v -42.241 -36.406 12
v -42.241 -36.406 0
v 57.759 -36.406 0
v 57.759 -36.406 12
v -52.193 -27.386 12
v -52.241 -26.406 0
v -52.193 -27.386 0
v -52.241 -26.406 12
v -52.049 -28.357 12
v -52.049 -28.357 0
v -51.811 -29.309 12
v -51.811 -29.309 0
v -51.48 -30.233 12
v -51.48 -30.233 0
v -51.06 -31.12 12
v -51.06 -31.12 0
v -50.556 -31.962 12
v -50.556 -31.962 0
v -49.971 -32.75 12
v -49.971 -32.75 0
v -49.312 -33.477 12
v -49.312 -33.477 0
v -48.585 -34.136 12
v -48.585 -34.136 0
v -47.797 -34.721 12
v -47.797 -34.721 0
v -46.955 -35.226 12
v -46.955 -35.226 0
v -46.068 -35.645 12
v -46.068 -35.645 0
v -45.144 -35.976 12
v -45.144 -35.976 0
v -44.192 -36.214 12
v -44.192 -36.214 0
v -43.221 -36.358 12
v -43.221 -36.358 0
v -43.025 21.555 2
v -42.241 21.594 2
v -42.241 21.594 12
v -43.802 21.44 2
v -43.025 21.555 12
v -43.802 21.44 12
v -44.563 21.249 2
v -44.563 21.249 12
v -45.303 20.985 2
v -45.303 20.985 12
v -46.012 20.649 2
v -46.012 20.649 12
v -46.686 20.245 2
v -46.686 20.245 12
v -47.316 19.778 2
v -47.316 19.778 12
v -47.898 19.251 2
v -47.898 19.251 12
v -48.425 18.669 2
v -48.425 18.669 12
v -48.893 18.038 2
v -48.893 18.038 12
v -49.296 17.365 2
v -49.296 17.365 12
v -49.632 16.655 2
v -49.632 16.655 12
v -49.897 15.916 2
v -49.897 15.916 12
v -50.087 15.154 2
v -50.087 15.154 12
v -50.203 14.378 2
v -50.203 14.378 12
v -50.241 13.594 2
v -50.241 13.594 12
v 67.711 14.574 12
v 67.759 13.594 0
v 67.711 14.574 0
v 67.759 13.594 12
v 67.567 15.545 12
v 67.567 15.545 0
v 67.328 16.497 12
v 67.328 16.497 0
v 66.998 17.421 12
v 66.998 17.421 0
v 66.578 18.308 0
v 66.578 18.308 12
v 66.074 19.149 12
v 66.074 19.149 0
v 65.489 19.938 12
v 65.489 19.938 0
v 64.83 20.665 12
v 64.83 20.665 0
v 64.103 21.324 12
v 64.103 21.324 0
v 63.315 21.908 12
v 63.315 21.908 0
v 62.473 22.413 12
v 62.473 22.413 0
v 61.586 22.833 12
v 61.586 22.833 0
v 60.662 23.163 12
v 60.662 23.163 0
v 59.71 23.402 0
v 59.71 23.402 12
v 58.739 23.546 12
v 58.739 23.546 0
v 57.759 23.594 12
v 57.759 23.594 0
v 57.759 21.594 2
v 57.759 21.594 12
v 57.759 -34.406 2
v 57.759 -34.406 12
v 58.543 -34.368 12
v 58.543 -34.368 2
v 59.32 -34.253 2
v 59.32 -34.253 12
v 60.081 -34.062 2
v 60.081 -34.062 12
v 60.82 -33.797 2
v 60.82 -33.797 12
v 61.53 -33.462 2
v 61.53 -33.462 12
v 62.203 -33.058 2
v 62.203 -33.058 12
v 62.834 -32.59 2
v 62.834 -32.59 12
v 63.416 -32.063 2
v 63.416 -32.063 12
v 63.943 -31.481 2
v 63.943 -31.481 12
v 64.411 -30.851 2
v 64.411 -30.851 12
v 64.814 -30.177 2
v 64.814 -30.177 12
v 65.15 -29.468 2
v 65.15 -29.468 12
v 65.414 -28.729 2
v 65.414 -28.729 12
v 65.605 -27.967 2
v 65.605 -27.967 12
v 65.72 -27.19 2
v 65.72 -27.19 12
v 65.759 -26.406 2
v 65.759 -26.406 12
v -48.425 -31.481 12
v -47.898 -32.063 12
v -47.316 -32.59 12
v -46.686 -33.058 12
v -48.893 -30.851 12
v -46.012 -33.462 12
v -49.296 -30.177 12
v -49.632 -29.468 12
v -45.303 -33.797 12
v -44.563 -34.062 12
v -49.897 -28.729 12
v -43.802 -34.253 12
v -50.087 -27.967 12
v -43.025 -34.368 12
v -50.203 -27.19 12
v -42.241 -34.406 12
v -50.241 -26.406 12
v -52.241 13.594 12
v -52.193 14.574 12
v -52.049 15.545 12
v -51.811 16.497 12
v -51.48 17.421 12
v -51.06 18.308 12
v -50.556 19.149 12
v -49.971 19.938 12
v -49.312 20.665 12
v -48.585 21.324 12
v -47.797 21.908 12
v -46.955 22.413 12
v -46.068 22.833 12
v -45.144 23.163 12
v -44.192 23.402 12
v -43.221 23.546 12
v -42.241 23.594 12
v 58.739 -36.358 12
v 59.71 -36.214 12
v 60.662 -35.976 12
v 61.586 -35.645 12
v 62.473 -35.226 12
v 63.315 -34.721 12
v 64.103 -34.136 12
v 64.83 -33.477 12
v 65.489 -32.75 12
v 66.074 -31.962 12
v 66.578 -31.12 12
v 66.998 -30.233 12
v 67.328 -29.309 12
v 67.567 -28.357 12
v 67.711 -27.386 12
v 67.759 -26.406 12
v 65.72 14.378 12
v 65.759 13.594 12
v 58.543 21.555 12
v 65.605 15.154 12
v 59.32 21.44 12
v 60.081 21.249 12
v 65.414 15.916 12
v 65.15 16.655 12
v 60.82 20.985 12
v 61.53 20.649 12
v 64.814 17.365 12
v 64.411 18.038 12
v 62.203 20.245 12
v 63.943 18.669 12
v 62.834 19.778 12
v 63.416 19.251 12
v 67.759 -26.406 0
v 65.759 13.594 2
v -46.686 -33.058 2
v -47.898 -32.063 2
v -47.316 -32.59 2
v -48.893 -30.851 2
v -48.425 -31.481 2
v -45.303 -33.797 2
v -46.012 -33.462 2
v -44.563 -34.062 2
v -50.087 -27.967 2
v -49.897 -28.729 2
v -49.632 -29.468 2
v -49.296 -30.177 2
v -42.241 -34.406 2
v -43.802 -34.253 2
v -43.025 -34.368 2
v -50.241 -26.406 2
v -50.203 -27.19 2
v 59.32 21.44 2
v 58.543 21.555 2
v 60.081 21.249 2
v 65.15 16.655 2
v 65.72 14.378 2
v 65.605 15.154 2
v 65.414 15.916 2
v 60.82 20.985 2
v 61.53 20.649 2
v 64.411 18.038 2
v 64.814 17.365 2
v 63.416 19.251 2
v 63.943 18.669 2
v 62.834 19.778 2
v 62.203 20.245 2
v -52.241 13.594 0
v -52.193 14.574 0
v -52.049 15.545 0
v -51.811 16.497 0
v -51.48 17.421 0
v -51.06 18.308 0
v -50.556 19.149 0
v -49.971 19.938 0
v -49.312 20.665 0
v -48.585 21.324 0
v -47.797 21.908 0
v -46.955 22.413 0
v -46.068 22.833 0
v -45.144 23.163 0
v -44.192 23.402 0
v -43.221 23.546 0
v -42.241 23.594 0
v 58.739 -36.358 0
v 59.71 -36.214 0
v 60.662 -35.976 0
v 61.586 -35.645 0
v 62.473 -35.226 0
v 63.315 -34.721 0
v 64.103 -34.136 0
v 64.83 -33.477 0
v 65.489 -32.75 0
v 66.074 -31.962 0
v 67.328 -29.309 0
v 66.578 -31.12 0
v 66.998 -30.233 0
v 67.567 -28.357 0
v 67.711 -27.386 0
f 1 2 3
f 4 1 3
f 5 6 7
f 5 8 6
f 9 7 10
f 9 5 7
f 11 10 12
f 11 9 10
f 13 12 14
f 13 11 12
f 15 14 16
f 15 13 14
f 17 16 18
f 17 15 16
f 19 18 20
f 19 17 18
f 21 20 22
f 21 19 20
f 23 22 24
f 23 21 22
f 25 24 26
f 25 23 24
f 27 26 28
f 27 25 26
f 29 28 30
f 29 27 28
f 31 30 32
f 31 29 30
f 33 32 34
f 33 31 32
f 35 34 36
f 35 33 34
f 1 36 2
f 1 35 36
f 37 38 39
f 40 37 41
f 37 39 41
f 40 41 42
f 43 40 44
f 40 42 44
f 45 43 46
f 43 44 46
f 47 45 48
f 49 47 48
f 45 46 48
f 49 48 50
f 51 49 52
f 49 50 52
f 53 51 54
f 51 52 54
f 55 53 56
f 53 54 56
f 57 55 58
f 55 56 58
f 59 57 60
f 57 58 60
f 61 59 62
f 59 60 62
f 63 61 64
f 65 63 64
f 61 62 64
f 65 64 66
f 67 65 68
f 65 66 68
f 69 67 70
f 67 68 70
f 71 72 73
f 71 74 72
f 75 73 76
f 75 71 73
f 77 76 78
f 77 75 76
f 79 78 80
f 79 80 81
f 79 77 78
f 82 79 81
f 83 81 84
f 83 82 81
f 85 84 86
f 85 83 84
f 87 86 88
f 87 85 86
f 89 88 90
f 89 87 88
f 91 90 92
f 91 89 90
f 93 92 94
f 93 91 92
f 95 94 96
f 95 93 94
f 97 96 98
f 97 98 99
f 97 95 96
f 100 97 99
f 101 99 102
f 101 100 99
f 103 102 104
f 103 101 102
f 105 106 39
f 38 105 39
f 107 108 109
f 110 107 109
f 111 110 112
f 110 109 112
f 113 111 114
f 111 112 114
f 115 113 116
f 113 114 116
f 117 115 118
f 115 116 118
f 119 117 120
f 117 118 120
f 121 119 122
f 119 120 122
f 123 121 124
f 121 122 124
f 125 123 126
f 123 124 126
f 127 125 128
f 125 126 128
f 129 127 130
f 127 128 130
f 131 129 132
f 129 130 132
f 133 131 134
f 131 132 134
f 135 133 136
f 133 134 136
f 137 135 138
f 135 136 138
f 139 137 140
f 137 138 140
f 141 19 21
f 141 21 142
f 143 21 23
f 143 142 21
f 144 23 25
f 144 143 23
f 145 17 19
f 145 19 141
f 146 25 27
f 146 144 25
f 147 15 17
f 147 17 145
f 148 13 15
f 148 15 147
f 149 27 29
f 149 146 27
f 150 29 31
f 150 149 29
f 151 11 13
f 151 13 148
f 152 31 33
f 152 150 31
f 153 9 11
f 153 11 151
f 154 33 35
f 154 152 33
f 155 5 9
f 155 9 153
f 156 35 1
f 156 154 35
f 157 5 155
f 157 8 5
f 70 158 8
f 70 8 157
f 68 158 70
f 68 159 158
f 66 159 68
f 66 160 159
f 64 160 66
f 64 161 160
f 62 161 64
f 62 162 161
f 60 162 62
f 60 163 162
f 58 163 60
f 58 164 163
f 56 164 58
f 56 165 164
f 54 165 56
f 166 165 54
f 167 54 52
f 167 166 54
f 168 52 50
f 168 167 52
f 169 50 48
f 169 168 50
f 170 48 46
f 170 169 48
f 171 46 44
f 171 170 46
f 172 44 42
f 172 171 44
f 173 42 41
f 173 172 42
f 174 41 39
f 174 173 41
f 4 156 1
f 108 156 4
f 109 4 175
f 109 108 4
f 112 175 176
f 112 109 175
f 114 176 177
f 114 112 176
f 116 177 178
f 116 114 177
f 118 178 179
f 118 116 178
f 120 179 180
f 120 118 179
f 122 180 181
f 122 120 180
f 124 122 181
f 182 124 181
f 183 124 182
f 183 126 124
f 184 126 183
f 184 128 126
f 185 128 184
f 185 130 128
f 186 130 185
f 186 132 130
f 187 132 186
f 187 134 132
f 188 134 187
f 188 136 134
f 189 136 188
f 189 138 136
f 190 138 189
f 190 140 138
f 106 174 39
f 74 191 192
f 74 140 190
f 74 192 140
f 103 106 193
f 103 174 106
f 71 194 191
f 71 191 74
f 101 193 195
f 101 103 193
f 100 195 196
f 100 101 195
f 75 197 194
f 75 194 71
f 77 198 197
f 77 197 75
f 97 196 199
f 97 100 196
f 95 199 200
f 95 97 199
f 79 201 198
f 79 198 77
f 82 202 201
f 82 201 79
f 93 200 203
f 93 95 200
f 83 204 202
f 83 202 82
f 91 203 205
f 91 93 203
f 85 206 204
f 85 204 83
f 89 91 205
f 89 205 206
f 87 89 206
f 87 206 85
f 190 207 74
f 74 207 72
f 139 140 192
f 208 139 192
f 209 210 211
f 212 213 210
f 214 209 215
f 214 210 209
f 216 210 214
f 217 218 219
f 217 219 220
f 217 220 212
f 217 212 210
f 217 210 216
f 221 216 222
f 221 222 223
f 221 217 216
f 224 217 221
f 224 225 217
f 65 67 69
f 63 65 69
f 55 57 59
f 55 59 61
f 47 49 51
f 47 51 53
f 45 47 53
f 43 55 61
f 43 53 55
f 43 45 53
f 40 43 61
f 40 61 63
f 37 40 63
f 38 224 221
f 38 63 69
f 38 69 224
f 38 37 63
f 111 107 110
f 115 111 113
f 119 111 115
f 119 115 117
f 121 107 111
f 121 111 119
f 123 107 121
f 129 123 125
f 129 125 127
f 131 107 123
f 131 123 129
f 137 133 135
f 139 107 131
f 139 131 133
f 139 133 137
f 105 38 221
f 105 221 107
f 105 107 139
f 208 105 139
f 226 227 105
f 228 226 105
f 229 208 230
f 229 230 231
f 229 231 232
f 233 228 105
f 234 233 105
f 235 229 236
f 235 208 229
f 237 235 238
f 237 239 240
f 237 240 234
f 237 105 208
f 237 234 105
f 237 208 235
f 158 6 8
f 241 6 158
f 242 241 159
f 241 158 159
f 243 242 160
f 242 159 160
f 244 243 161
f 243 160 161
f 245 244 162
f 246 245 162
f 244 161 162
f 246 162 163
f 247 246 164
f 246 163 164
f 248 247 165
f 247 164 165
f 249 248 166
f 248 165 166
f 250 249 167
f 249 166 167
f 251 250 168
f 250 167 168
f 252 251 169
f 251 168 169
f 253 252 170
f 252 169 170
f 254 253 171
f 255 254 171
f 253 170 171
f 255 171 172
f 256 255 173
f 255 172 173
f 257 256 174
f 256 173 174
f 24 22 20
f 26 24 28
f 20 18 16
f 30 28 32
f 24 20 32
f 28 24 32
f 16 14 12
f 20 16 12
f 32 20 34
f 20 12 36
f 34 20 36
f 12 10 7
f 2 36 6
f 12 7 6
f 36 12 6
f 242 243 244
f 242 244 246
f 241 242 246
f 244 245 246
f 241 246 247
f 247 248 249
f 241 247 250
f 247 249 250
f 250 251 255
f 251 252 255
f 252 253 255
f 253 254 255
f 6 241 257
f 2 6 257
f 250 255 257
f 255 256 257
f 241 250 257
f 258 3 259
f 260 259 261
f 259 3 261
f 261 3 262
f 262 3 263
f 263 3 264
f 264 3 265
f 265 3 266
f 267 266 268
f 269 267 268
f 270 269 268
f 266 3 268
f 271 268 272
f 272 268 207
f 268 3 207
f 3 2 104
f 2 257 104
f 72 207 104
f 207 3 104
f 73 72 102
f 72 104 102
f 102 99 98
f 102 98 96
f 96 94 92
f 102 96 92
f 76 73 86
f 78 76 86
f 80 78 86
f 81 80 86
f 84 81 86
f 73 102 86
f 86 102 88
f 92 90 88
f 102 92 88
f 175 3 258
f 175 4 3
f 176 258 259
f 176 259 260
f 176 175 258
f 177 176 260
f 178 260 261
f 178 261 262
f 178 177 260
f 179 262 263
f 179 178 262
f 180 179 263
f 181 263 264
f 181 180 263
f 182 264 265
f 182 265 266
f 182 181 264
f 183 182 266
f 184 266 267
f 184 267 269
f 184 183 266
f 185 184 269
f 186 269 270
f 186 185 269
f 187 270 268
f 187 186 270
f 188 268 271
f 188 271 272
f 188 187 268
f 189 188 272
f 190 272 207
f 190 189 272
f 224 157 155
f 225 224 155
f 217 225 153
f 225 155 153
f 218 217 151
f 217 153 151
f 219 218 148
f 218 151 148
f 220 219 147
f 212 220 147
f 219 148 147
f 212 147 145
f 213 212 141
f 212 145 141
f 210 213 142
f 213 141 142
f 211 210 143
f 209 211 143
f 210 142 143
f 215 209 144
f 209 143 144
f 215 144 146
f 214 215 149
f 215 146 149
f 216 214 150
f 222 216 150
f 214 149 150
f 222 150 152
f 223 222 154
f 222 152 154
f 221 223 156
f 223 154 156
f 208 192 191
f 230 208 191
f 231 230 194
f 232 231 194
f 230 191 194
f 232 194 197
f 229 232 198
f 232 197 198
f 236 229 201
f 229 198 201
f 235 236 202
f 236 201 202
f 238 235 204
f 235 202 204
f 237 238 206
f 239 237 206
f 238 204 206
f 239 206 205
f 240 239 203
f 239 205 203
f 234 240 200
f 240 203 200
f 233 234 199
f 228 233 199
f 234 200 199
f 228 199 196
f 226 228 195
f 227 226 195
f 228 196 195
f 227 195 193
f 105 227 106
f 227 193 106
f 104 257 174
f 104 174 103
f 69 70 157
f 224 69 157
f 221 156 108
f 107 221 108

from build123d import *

# Parameters (mm, degrees)
F0_W     = 120
F0_H     = 60
F1_DEPTH = 12
F2_R     = 10
F4_DEPTH = 10


with BuildPart() as f1:
    # F0 (on Top) → F1 (new body)
    with BuildSketch(Plane.XY):
        with Locations((7.758874, -6.406293)):
            Rectangle(F0_W, F0_H)
    extrude(amount=F1_DEPTH)

    # F2
    f2_edges = [f1.edges().sort_by_distance(p)[0] for p in [
        (-52.241126, -36.406293, 6),
        (67.758874, -36.406293, 6),
        (67.758874, 23.593707, 6),
        (-52.241126, 23.593707, 6),
    ]]
    fillet(f2_edges, radius=F2_R)

    # F3 (on face) → F4 (cut)
    with BuildSketch(Plane.XY.offset(12)):
        with BuildLine():
            Line((65.758874, -26.406293), (65.758874, 13.593707))
            ThreePointArc((65.758874, 13.593707), (63.415729, 19.250562), (57.758874, 21.593707))
            Line((57.758874, 21.593707), (-42.241126, 21.593707))
            ThreePointArc((-42.241126, 21.593707), (-47.89798, 19.250562), (-50.241126, 13.593707))
            Line((-50.241126, 13.593707), (-50.241126, -26.406293))
            ThreePointArc((-50.241126, -26.406293), (-47.89798, -32.063147), (-42.241126, -34.406293))
            Line((-42.241126, -34.406293), (57.758874, -34.406293))
            ThreePointArc((57.758874, -34.406293), (63.415729, -32.063147), (65.758874, -26.406293))
        make_face()
    extrude(amount=-F4_DEPTH, mode=Mode.SUBTRACT)


solid = f1.part
